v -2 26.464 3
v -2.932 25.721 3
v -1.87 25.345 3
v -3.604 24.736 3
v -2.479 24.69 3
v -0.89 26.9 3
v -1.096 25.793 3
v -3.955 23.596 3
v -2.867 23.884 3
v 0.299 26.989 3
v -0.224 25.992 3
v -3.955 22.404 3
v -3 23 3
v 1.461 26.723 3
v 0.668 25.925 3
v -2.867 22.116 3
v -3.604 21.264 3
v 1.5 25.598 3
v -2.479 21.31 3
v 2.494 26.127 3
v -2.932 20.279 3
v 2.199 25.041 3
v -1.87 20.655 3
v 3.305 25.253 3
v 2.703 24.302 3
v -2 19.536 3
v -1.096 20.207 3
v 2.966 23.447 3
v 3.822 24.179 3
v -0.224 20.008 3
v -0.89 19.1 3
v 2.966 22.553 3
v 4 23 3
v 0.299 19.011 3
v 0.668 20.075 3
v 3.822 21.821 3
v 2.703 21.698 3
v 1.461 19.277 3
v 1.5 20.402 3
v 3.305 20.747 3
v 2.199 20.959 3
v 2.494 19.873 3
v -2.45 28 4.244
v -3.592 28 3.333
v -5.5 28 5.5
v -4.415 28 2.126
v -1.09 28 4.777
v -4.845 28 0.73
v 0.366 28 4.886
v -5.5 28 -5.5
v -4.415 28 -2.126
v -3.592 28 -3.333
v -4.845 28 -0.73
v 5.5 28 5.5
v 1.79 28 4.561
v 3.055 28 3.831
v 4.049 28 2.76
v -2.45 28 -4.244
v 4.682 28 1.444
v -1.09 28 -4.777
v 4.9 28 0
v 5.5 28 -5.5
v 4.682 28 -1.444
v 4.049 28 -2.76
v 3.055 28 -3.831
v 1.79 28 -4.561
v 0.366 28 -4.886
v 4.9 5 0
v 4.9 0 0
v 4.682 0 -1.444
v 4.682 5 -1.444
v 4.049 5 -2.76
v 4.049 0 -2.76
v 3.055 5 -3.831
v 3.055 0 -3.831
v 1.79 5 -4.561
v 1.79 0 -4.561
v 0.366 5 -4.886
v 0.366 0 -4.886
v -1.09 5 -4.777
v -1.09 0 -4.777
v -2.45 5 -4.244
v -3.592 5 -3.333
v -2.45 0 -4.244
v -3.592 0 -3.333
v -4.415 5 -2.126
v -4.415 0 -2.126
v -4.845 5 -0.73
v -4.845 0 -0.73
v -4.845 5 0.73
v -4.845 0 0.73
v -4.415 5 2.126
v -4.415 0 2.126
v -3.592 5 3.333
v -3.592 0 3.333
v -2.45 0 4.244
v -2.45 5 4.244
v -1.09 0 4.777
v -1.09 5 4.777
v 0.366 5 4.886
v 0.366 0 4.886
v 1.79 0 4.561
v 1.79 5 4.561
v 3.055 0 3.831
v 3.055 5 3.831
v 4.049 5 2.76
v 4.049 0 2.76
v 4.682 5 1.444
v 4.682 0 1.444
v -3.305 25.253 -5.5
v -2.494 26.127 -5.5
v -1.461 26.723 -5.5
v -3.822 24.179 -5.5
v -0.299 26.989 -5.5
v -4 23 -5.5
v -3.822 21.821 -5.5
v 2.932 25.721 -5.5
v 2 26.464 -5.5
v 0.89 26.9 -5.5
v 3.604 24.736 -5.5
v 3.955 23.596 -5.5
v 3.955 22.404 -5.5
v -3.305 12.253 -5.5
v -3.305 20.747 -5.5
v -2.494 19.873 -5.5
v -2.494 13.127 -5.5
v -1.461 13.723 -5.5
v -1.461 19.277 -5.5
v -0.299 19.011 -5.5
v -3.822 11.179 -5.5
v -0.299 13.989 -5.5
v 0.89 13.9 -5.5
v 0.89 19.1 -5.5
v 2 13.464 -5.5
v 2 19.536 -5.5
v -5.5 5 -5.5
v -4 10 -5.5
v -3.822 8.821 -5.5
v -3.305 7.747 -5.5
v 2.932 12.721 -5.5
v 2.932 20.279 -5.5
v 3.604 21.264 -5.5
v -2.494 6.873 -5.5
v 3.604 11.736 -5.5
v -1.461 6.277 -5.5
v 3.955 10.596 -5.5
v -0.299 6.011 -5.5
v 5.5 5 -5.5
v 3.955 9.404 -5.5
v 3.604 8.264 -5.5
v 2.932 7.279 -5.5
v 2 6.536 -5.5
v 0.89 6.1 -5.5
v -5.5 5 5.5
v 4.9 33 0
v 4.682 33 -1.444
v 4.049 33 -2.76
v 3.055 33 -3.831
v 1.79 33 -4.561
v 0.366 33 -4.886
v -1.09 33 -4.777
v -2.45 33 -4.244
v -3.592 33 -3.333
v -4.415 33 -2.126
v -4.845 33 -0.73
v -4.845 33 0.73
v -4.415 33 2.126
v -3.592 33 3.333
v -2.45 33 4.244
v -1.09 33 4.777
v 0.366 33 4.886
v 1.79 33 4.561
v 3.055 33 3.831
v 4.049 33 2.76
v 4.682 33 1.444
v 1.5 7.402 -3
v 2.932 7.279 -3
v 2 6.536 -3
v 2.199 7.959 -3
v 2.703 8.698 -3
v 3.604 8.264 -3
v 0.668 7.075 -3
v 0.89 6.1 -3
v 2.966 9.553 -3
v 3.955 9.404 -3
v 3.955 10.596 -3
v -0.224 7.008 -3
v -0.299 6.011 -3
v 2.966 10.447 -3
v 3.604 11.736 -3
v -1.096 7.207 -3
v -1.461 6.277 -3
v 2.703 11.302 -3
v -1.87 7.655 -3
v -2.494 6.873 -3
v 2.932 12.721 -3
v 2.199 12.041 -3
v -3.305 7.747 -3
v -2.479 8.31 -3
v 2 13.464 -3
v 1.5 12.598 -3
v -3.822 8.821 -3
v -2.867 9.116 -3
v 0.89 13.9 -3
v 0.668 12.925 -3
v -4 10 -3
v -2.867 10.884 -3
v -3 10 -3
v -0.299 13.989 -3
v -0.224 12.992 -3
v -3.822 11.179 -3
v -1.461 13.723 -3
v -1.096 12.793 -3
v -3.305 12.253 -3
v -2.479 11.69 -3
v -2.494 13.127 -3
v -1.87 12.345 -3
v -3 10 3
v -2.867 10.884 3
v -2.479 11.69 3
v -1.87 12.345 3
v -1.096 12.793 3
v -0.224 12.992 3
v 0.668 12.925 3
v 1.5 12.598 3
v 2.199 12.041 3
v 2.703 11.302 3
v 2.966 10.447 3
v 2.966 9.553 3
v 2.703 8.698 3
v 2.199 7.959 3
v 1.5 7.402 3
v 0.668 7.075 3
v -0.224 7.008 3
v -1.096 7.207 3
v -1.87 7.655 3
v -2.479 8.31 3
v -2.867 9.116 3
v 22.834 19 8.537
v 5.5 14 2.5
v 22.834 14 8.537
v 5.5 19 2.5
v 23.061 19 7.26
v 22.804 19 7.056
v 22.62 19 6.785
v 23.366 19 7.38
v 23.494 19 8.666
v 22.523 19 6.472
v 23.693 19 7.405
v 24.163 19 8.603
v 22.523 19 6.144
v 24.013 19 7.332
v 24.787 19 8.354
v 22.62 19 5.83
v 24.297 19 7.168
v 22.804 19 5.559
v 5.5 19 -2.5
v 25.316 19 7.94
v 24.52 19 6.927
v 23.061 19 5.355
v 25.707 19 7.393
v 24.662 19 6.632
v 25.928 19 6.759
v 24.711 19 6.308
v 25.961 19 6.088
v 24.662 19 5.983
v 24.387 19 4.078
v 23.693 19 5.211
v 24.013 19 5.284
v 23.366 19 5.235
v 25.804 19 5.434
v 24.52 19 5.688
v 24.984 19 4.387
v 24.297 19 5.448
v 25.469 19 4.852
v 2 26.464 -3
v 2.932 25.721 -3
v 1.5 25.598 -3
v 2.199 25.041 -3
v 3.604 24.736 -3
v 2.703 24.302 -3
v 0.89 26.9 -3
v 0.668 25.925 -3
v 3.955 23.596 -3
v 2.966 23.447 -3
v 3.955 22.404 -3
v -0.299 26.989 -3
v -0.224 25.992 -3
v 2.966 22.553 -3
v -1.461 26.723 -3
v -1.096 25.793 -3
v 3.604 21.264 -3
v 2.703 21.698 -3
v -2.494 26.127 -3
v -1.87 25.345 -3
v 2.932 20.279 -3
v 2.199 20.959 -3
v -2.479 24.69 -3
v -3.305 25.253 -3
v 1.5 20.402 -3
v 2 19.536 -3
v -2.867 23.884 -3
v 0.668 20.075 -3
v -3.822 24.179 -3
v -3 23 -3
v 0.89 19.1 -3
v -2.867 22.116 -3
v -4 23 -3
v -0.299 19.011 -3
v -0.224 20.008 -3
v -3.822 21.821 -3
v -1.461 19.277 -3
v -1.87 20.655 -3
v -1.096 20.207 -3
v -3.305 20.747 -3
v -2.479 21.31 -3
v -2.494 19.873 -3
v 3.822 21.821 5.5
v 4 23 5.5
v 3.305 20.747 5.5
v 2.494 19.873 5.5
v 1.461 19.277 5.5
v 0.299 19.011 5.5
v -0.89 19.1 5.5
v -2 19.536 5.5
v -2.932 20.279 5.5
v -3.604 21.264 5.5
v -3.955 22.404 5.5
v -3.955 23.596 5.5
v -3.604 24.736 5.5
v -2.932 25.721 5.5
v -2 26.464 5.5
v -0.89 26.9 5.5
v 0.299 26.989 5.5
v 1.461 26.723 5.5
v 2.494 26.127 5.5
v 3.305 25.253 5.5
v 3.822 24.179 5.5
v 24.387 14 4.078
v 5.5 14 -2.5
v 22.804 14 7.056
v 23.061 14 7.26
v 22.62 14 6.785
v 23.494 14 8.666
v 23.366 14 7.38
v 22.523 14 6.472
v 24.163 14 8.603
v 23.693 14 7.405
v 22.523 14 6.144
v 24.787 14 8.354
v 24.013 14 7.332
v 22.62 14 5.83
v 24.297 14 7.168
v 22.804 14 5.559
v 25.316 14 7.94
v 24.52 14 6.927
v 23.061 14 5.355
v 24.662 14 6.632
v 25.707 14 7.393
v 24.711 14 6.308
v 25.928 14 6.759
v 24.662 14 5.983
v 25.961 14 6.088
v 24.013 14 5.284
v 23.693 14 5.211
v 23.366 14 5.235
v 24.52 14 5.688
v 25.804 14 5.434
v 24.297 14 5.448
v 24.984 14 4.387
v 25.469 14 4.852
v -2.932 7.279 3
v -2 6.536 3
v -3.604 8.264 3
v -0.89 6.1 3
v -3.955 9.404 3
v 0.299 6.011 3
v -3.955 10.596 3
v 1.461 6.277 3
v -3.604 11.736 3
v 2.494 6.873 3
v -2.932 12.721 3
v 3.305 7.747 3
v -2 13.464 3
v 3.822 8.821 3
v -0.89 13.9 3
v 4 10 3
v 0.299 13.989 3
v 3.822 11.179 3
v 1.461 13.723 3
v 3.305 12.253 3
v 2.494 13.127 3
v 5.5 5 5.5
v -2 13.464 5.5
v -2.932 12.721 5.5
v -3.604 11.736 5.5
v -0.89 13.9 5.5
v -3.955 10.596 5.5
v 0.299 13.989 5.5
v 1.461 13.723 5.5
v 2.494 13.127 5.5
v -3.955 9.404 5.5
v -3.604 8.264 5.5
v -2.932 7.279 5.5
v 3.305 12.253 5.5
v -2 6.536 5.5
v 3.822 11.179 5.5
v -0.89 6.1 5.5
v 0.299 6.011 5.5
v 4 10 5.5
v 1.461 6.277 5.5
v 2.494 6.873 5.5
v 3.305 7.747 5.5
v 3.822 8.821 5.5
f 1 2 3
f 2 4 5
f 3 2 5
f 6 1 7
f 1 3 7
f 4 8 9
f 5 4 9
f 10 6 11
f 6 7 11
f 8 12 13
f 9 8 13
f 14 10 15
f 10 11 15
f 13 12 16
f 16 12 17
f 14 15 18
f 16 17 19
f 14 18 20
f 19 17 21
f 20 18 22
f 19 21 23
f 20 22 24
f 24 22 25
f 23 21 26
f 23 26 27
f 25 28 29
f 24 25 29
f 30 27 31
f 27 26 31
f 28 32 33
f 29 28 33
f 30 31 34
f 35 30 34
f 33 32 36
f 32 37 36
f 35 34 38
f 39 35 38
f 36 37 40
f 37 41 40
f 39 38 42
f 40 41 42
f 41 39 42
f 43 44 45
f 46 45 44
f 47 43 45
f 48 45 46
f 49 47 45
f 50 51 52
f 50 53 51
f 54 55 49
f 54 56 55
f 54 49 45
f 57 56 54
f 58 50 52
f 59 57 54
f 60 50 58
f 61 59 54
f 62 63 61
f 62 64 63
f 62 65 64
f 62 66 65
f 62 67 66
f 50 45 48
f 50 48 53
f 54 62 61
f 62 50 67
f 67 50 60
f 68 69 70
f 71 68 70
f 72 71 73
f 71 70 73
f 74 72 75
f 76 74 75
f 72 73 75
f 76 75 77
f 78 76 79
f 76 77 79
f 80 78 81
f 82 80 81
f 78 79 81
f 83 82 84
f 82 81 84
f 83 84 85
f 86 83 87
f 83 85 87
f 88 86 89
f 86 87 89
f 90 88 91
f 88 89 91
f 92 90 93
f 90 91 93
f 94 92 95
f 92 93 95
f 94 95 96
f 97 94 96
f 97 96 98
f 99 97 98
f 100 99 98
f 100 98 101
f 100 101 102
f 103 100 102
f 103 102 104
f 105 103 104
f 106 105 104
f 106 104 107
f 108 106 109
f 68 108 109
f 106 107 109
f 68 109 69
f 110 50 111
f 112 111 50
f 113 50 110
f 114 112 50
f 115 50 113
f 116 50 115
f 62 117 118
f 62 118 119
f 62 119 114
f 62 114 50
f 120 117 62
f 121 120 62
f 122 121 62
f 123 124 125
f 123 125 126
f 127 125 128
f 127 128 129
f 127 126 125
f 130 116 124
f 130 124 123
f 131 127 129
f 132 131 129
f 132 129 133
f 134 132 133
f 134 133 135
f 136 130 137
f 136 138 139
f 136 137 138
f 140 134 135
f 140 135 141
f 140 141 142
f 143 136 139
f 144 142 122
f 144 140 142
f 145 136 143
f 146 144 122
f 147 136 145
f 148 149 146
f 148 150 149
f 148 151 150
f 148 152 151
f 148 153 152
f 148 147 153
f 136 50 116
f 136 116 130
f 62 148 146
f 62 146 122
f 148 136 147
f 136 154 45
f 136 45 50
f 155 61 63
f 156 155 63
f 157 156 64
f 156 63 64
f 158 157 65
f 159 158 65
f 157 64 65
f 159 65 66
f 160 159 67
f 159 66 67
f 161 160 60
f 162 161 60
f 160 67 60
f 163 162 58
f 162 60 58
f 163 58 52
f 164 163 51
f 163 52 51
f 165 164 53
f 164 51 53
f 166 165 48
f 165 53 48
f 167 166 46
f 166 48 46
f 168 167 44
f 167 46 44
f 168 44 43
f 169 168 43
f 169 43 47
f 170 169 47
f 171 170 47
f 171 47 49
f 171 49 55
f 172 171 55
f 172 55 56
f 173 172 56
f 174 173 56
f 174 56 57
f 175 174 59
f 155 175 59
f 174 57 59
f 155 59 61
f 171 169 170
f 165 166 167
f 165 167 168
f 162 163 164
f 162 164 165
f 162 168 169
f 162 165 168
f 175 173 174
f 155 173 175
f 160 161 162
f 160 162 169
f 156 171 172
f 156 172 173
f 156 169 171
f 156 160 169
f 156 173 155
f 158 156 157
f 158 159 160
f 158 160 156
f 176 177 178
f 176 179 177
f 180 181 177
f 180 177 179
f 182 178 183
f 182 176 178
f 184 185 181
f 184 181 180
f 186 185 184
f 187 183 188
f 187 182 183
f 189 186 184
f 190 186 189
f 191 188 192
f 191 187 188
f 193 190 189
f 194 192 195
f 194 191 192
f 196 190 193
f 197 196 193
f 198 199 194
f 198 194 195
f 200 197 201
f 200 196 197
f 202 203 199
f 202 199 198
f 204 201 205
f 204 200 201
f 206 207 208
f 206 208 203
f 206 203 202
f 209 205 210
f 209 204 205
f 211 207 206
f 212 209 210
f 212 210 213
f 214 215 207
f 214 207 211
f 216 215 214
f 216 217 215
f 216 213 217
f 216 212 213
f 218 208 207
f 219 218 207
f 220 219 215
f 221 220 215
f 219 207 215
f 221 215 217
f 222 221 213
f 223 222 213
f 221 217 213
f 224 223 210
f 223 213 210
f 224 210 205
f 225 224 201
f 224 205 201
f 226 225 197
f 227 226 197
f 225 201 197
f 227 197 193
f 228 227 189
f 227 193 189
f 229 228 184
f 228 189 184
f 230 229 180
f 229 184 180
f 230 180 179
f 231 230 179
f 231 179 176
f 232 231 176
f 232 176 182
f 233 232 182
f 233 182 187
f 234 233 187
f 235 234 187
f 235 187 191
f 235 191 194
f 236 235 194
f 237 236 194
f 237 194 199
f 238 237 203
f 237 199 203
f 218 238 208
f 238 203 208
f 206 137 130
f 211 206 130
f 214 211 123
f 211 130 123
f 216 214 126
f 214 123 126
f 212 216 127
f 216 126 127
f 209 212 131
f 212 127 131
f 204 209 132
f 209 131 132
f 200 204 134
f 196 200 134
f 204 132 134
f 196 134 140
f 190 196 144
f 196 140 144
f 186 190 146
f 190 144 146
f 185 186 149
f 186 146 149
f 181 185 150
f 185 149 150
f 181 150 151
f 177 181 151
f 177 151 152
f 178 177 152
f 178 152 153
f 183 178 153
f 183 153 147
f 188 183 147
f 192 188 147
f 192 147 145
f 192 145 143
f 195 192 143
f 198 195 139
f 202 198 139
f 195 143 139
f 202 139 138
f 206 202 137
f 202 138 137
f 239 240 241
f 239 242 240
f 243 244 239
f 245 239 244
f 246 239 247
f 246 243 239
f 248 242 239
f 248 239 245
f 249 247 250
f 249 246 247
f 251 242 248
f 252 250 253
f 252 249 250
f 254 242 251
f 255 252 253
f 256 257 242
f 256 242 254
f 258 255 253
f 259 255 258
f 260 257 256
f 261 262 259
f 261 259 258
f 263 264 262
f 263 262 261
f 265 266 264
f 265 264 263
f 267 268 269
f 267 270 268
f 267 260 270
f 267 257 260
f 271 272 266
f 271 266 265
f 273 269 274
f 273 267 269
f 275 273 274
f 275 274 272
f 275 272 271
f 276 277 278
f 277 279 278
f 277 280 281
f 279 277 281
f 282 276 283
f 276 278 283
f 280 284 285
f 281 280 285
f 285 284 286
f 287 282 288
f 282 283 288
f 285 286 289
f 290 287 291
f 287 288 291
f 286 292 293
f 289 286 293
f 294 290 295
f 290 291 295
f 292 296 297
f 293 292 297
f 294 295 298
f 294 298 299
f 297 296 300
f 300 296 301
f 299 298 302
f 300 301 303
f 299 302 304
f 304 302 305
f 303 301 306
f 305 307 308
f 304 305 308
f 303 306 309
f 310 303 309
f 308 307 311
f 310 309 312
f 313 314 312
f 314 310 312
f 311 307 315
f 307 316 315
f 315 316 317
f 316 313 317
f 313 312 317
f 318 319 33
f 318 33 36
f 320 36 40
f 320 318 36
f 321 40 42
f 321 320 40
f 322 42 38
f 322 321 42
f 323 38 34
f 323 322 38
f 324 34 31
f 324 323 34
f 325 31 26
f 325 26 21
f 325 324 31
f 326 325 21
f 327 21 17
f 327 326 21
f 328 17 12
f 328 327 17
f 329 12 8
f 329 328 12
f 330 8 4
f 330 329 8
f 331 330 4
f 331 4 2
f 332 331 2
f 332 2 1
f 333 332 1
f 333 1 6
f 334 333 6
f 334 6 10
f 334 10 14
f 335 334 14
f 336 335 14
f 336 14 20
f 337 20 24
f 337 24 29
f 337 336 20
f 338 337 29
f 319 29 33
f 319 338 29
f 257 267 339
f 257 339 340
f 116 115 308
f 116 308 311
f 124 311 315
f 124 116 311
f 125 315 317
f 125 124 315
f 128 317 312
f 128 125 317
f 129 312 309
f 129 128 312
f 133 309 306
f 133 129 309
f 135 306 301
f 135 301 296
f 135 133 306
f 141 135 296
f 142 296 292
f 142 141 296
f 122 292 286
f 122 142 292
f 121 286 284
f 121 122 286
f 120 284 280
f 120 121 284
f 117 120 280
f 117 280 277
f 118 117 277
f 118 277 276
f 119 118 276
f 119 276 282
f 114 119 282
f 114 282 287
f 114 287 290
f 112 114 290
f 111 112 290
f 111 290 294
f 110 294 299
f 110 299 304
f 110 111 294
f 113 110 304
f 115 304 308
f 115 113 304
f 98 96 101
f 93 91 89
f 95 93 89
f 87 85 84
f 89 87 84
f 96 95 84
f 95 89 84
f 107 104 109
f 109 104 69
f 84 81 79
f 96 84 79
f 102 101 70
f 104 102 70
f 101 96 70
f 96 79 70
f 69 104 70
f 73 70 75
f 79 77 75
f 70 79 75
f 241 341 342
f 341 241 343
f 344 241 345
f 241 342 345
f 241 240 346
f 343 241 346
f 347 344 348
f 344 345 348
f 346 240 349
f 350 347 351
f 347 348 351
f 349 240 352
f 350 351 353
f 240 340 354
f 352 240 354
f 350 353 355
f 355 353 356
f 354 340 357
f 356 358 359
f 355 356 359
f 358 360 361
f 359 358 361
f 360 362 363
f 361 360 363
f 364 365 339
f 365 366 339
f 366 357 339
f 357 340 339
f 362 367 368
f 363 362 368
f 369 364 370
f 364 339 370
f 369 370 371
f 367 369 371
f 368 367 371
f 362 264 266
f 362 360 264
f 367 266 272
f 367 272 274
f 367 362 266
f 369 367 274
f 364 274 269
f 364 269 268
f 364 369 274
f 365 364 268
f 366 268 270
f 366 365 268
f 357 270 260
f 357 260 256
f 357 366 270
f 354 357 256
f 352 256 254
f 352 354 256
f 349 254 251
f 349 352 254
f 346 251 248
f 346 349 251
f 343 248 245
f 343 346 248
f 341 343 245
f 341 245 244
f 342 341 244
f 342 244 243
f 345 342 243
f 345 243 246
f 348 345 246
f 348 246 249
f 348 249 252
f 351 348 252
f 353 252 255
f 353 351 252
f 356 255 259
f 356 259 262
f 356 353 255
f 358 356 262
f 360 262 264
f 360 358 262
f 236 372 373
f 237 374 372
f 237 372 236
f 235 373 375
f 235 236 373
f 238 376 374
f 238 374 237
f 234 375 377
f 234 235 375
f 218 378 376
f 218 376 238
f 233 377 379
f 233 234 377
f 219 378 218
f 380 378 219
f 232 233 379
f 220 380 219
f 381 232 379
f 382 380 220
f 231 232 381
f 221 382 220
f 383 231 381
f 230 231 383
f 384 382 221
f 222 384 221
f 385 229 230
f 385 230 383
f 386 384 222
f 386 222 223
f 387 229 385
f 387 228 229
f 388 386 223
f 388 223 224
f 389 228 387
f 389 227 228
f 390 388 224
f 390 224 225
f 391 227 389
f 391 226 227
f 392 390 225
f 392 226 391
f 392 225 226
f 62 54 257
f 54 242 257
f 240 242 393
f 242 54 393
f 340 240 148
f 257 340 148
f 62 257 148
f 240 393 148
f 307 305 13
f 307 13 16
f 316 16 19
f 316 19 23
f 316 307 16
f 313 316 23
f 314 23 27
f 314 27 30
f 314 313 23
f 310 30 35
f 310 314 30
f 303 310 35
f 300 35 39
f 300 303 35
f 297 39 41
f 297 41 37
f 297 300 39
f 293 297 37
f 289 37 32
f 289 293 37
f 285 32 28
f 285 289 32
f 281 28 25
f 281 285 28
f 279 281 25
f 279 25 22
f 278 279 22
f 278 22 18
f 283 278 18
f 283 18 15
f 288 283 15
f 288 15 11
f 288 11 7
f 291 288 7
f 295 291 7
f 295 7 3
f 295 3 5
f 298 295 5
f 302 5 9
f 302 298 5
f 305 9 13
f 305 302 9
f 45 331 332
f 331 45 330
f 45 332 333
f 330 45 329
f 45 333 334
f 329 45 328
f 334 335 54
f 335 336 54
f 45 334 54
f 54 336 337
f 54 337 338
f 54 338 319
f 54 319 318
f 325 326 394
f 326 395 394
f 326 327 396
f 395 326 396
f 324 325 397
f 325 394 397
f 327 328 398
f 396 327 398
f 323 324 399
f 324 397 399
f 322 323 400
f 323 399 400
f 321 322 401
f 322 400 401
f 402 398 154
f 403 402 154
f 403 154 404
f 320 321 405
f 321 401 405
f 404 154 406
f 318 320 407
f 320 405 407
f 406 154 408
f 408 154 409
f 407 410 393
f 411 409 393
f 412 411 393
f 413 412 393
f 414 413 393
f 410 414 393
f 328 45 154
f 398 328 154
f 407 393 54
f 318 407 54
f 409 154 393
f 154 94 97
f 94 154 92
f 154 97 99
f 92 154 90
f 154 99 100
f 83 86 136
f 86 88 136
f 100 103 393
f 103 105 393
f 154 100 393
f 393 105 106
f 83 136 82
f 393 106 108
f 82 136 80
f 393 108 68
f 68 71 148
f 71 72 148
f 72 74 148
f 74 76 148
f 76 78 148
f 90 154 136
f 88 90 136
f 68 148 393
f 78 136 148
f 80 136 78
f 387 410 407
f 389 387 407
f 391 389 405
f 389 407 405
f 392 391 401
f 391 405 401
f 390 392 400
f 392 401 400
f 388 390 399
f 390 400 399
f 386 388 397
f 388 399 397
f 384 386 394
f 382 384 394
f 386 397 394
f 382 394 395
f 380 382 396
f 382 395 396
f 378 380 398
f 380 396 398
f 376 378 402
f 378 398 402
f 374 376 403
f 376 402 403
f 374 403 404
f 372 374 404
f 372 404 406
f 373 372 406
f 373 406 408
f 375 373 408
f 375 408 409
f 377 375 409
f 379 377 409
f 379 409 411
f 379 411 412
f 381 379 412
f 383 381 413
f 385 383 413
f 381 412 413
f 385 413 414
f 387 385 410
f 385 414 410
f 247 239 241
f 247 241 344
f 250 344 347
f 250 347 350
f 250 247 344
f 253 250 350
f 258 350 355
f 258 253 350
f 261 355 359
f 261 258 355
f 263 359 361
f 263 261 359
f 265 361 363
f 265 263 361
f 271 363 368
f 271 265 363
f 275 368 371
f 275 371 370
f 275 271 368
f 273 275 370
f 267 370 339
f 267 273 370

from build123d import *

# Parameters (mm, degrees)
SKETCH1_R           = 4.9
BOSS_EXTRUDE1_DEPTH = 5
SKETCH2_W           = 11
SKETCH2_H           = 11
BOSS_EXTRUDE2_DEPTH = 23
SKETCH3_R           = 4
CUT_EXTRUDE1_DEPTH  = 2.5
SKETCH4_R           = 4
CUT_EXTRUDE2_DEPTH  = 2.5
SKETCH5_R           = 3
CUT_EXTRUDE3_DEPTH  = 6
SKETCH6_R           = 4.9
BOSS_EXTRUDE3_DEPTH = 5
SKETCH7_R           = 1.1
BOSS_EXTRUDE4_DEPTH = 2.5


with BuildPart() as part:
    # Sketch1 → Boss-Extrude1 (new body)
    with BuildSketch(Plane(origin=(0, 0, 0), x_dir=(1, 0, 0), z_dir=(0, 1, 0))):
        Circle(SKETCH1_R)
    extrude(amount=BOSS_EXTRUDE1_DEPTH)

    # Sketch2 → Boss-Extrude2 (add)
    with BuildSketch(Plane(origin=(0, 5, 0), x_dir=(1, 0, 0), z_dir=(0, 1, 0))):
        Rectangle(SKETCH2_W, SKETCH2_H)
    extrude(amount=BOSS_EXTRUDE2_DEPTH)

    # Sketch3 → Cut-Extrude1 (cut)
    with BuildSketch(Plane.XY.offset(5.5)):
        with Locations((0, 10)):
            Circle(SKETCH3_R)
    cut_extrude1 = extrude(amount=-CUT_EXTRUDE1_DEPTH, mode=Mode.SUBTRACT)

    # Sketch4 → Cut-Extrude2 (cut)
    with BuildSketch(Plane(origin=(0, 0, -5.5), x_dir=(-1, 0, 0), z_dir=(0, 0, -1))):
        with Locations((0, 10)):
            Circle(SKETCH4_R)
    cut_extrude2 = extrude(amount=-CUT_EXTRUDE2_DEPTH, mode=Mode.SUBTRACT)

    # Sketch5 → Cut-Extrude3 (cut)
    with BuildSketch(Plane(origin=(0, 0, -3), x_dir=(-1, 0, 0), z_dir=(0, 0, -1))):
        with Locations((0, 10)):
            Circle(SKETCH5_R)
    cut_extrude3 = extrude(amount=-CUT_EXTRUDE3_DEPTH, mode=Mode.SUBTRACT)

    # Sketch6 → Boss-Extrude3 (add)
    with BuildSketch(Plane(origin=(0, 28, 0), x_dir=(1, 0, 0), z_dir=(0, 1, 0))):
        Circle(SKETCH6_R)
    extrude(amount=BOSS_EXTRUDE3_DEPTH)

    # Sketch7 → Boss-Extrude4 (add, symmetric)
    with BuildSketch(Plane(origin=(0, 16.5, 0), x_dir=(1, 0, 0), z_dir=(0, 1, 0))):
        with BuildLine():
            Line((5.5, -2.5), (22.834272834, -8.537145633))
            ThreePointArc((22.834272834, -8.537145633), (25.840339287, -7.084092403), (24.387286057, -4.07802595))
            Line((24.387286057, -4.07802595), (5.5, 2.5))
            Line((5.5, 2.5), (5.5, 0))
            Line((5.5, 0), (5.5, -2.5))
        make_face()
        with Locations((23.610779446, -6.307585792)):
            Circle(SKETCH7_R, mode=Mode.SUBTRACT)
    extrude(amount=BOSS_EXTRUDE4_DEPTH, both=True)

    # Mirror1: Cut-Extrude1 across plane
    add(cut_extrude1.mirror(Plane.ZX.offset(16.5)), mode=Mode.SUBTRACT)

    # Mirror2: Cut-Extrude2 across plane
    add(cut_extrude2.mirror(Plane.ZX.offset(16.5)), mode=Mode.SUBTRACT)

    # Mirror3: Cut-Extrude3 across plane
    add(cut_extrude3.mirror(Plane.ZX.offset(16.5)), mode=Mode.SUBTRACT)


solid = part.part
